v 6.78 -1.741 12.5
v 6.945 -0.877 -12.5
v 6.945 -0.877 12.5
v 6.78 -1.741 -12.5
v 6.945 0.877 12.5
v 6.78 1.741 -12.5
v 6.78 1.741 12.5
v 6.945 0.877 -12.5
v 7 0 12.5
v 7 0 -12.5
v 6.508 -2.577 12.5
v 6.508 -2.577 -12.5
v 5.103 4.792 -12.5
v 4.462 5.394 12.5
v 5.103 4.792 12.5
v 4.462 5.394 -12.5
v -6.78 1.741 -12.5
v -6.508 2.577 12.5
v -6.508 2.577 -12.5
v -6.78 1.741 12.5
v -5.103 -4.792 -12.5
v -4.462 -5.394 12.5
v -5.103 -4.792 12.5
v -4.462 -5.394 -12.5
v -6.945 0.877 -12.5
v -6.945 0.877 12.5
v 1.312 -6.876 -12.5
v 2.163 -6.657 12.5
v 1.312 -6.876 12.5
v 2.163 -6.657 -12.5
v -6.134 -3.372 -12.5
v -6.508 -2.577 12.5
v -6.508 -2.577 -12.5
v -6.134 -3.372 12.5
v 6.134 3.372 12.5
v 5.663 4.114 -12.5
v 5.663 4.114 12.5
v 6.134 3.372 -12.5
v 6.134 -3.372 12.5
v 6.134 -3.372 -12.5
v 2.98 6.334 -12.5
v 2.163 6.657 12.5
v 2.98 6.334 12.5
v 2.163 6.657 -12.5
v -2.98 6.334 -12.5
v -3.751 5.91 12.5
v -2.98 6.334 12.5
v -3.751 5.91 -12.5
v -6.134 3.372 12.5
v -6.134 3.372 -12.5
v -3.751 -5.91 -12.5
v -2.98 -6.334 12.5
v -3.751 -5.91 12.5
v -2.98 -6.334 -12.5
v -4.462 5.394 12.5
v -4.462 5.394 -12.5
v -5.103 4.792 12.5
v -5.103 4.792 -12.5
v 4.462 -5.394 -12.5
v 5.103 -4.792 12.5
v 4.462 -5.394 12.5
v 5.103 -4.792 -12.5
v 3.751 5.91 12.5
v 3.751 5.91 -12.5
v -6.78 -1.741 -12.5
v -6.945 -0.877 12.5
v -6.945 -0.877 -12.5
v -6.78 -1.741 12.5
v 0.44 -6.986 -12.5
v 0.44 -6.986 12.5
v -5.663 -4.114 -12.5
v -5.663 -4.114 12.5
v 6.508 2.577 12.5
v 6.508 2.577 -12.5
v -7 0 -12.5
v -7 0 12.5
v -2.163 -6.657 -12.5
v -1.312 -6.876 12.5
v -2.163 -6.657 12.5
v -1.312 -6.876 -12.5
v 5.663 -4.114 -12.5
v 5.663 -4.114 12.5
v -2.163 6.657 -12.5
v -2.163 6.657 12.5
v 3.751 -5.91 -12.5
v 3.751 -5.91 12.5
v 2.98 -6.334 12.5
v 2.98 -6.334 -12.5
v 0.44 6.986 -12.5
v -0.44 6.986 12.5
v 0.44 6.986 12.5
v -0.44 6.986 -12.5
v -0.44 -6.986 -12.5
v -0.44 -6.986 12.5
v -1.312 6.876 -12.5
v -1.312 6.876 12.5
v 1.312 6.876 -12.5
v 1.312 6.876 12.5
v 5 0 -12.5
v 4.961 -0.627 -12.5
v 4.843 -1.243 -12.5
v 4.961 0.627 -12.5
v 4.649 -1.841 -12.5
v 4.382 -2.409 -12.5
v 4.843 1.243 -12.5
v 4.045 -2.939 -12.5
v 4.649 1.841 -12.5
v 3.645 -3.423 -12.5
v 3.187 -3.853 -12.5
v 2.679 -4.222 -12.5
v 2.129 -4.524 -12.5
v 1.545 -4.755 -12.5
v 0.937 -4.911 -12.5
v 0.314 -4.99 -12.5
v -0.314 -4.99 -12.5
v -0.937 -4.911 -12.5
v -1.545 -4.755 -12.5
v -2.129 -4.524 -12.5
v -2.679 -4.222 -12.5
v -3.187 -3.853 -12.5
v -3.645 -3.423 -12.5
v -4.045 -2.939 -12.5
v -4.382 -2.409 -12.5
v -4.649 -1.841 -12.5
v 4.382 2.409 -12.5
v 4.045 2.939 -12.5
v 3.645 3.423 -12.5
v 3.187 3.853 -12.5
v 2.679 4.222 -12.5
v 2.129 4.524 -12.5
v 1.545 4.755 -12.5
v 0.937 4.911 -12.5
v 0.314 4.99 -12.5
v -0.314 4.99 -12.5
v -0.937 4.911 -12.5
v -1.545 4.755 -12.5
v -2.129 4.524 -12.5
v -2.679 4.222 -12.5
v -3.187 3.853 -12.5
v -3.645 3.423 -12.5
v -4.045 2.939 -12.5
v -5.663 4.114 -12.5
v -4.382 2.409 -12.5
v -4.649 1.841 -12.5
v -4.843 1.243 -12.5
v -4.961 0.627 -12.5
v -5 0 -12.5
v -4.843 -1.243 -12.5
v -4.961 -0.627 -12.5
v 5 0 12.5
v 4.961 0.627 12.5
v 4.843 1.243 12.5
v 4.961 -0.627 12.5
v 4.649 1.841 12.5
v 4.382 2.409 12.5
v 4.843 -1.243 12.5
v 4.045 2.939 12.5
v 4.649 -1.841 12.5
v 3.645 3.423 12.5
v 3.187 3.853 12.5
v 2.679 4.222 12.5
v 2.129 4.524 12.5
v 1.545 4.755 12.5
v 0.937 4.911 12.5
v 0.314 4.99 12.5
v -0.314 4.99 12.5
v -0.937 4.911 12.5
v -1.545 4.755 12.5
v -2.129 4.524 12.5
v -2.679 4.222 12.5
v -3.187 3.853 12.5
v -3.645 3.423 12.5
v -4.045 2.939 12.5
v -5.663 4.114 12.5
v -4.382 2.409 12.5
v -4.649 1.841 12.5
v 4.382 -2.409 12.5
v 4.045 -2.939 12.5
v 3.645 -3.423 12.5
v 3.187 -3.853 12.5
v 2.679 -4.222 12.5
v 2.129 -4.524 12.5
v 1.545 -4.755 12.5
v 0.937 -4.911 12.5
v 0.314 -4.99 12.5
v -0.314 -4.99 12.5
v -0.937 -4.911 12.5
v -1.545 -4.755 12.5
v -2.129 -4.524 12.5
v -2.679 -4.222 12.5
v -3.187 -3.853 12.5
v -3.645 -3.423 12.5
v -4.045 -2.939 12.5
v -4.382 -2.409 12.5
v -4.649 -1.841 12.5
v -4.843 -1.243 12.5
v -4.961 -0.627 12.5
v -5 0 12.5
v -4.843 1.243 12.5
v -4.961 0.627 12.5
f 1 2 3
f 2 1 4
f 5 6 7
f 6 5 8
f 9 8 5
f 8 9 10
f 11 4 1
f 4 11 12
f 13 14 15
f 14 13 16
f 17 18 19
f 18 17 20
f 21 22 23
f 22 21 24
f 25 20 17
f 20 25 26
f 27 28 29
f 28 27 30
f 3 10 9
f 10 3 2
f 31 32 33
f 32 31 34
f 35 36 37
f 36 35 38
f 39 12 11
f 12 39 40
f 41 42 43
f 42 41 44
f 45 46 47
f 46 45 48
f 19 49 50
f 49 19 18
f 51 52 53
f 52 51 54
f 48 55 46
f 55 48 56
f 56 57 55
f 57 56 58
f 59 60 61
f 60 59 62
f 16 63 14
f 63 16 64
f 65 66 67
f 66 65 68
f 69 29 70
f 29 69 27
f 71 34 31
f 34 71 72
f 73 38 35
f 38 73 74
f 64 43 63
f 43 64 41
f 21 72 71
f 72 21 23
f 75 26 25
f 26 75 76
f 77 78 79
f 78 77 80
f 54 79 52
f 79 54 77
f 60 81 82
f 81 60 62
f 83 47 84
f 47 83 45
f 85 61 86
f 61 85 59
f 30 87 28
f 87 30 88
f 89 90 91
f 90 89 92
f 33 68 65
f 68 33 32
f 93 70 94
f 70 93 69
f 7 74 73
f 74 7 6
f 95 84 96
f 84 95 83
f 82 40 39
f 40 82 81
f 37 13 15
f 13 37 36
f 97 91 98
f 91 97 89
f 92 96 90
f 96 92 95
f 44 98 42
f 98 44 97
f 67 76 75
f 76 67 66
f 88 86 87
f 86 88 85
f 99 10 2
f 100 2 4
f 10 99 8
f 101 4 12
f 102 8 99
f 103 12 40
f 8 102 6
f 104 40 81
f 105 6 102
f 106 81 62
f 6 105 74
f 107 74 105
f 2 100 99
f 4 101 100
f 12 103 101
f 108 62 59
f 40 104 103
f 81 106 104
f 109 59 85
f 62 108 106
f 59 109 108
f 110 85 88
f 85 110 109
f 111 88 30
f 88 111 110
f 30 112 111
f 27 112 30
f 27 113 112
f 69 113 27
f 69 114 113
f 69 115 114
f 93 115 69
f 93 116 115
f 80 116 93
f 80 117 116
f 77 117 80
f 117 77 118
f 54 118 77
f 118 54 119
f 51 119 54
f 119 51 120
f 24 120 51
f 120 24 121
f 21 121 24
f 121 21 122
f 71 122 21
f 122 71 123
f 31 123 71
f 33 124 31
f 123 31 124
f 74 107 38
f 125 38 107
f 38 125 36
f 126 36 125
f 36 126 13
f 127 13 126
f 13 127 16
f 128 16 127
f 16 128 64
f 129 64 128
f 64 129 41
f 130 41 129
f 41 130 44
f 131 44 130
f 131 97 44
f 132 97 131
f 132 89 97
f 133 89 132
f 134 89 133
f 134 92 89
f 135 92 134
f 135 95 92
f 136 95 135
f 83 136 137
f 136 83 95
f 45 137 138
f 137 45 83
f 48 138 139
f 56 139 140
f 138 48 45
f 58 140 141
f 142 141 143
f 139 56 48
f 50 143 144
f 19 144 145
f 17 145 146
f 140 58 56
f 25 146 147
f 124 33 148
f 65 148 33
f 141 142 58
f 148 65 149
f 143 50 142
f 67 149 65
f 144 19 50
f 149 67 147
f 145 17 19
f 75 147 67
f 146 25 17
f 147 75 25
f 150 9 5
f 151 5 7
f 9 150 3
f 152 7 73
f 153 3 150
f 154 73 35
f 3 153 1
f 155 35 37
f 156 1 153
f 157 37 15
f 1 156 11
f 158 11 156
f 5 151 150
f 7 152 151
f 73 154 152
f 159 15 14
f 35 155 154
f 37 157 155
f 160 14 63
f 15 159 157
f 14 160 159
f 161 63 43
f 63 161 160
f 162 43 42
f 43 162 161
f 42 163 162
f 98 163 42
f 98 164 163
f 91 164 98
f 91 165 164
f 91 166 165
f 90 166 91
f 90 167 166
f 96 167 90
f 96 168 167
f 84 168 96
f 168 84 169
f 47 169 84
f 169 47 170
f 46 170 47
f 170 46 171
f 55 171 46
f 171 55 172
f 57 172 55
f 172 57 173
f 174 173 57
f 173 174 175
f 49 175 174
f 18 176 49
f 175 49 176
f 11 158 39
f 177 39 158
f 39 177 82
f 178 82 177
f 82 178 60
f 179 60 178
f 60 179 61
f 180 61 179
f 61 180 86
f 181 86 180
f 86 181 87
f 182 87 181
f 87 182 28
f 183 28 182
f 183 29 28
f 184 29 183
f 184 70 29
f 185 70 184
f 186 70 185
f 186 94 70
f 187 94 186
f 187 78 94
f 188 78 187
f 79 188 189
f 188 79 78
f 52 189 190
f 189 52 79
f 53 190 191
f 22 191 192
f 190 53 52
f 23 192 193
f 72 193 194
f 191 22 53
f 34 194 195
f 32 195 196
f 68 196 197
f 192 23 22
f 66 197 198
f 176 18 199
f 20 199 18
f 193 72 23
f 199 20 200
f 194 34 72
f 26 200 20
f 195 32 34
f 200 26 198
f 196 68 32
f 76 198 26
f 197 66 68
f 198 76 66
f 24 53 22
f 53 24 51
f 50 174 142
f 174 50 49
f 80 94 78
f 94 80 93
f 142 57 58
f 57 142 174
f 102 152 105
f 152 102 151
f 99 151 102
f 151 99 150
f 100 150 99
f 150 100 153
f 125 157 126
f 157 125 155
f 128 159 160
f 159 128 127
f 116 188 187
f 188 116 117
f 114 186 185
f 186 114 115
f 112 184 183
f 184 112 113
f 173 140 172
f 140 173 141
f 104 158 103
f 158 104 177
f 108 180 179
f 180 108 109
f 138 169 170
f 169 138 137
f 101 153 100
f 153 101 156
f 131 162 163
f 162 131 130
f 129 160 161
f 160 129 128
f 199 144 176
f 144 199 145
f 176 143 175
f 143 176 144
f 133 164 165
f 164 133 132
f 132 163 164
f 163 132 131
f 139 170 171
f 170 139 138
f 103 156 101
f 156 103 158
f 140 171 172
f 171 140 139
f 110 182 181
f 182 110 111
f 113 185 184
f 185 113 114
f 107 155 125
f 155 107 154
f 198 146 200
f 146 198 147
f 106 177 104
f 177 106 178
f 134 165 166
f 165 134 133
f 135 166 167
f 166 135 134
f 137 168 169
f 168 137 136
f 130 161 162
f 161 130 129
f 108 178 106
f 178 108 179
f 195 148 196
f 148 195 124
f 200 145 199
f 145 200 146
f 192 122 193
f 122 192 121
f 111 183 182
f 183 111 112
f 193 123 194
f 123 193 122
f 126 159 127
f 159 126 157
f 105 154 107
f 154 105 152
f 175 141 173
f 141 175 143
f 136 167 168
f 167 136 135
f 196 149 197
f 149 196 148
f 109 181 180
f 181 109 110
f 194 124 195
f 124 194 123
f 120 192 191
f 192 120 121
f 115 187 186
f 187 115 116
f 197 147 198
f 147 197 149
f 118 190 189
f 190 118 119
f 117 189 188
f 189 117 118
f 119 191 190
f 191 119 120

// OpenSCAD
$fn = 50;


difference() {
	union() {
		translate(v = [0, 0, -12.5000000000]) {
			cylinder(h = 25, r = 7.0000000000);
		}
	}
	union() {
		translate(v = [0, 0, -100.0000000000]) {
			cylinder(h = 200, r = 5.0000000000);
		}
	}
}
